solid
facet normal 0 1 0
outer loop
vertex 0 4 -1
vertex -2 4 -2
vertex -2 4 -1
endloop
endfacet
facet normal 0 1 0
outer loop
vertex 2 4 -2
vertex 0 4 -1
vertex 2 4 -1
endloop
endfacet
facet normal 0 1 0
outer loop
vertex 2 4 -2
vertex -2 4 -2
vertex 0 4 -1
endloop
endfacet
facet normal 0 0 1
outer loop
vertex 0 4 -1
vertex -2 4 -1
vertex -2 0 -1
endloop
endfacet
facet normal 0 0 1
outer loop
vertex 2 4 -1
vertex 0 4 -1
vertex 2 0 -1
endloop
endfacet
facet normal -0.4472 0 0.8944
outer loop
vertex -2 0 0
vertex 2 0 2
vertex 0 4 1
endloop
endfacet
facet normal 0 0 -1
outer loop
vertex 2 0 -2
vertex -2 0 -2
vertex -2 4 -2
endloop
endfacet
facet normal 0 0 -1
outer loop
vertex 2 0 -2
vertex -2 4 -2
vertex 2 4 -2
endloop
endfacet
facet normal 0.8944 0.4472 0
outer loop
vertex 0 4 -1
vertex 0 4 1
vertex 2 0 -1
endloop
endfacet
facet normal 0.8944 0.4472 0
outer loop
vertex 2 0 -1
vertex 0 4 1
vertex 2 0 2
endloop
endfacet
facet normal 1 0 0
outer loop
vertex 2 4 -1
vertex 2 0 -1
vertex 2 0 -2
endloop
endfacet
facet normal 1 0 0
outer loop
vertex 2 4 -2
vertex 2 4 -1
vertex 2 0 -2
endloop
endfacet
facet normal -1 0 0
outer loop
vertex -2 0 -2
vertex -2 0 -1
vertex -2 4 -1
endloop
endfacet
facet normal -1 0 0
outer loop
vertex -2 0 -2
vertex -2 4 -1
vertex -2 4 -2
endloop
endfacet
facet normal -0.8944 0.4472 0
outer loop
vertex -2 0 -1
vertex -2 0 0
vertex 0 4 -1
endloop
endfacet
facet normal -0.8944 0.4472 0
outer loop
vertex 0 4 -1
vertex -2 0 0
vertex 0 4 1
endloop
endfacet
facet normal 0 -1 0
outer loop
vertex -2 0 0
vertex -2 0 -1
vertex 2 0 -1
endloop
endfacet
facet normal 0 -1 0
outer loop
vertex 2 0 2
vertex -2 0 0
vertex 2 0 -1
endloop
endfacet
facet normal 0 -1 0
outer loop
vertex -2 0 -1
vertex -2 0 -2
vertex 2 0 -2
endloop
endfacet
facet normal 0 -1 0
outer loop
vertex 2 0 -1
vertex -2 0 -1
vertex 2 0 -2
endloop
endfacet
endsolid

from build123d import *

# Parameters (mm, degrees)
SKETCH2_W           = 4
SKETCH2_H           = 4
BOSS_EXTRUDE1_DEPTH = 4
CUT_EXTRUDE1_DEPTH  = 3
CUT_EXTRUDE2_DEPTH  = 7


with BuildPart() as part:
    # Sketch2 → Boss-Extrude1 (new body)
    with BuildSketch(Plane(origin=(0, 0, 0), x_dir=(1, 0, 0), z_dir=(0, 1, 0))):
        Rectangle(SKETCH2_W, SKETCH2_H)
    extrude(amount=BOSS_EXTRUDE1_DEPTH)

    # Sketch3 → Cut-Extrude1 (cut)
    with BuildSketch(Plane.XY.offset(2)):
        Polygon((2, 4), (0, 4), (2, 0), align=None)
        Polygon((-2, 4), (-2, 0), (0, 4), align=None)
    extrude(amount=-CUT_EXTRUDE1_DEPTH, mode=Mode.SUBTRACT)

    # Sketch4 → Cut-Extrude2 (cut)
    with BuildSketch(Plane.XZ):
        Polygon((2, 2), (-2, 0), (-2, 2), align=None)
    extrude(amount=-CUT_EXTRUDE2_DEPTH, mode=Mode.SUBTRACT)


solid = part.part
